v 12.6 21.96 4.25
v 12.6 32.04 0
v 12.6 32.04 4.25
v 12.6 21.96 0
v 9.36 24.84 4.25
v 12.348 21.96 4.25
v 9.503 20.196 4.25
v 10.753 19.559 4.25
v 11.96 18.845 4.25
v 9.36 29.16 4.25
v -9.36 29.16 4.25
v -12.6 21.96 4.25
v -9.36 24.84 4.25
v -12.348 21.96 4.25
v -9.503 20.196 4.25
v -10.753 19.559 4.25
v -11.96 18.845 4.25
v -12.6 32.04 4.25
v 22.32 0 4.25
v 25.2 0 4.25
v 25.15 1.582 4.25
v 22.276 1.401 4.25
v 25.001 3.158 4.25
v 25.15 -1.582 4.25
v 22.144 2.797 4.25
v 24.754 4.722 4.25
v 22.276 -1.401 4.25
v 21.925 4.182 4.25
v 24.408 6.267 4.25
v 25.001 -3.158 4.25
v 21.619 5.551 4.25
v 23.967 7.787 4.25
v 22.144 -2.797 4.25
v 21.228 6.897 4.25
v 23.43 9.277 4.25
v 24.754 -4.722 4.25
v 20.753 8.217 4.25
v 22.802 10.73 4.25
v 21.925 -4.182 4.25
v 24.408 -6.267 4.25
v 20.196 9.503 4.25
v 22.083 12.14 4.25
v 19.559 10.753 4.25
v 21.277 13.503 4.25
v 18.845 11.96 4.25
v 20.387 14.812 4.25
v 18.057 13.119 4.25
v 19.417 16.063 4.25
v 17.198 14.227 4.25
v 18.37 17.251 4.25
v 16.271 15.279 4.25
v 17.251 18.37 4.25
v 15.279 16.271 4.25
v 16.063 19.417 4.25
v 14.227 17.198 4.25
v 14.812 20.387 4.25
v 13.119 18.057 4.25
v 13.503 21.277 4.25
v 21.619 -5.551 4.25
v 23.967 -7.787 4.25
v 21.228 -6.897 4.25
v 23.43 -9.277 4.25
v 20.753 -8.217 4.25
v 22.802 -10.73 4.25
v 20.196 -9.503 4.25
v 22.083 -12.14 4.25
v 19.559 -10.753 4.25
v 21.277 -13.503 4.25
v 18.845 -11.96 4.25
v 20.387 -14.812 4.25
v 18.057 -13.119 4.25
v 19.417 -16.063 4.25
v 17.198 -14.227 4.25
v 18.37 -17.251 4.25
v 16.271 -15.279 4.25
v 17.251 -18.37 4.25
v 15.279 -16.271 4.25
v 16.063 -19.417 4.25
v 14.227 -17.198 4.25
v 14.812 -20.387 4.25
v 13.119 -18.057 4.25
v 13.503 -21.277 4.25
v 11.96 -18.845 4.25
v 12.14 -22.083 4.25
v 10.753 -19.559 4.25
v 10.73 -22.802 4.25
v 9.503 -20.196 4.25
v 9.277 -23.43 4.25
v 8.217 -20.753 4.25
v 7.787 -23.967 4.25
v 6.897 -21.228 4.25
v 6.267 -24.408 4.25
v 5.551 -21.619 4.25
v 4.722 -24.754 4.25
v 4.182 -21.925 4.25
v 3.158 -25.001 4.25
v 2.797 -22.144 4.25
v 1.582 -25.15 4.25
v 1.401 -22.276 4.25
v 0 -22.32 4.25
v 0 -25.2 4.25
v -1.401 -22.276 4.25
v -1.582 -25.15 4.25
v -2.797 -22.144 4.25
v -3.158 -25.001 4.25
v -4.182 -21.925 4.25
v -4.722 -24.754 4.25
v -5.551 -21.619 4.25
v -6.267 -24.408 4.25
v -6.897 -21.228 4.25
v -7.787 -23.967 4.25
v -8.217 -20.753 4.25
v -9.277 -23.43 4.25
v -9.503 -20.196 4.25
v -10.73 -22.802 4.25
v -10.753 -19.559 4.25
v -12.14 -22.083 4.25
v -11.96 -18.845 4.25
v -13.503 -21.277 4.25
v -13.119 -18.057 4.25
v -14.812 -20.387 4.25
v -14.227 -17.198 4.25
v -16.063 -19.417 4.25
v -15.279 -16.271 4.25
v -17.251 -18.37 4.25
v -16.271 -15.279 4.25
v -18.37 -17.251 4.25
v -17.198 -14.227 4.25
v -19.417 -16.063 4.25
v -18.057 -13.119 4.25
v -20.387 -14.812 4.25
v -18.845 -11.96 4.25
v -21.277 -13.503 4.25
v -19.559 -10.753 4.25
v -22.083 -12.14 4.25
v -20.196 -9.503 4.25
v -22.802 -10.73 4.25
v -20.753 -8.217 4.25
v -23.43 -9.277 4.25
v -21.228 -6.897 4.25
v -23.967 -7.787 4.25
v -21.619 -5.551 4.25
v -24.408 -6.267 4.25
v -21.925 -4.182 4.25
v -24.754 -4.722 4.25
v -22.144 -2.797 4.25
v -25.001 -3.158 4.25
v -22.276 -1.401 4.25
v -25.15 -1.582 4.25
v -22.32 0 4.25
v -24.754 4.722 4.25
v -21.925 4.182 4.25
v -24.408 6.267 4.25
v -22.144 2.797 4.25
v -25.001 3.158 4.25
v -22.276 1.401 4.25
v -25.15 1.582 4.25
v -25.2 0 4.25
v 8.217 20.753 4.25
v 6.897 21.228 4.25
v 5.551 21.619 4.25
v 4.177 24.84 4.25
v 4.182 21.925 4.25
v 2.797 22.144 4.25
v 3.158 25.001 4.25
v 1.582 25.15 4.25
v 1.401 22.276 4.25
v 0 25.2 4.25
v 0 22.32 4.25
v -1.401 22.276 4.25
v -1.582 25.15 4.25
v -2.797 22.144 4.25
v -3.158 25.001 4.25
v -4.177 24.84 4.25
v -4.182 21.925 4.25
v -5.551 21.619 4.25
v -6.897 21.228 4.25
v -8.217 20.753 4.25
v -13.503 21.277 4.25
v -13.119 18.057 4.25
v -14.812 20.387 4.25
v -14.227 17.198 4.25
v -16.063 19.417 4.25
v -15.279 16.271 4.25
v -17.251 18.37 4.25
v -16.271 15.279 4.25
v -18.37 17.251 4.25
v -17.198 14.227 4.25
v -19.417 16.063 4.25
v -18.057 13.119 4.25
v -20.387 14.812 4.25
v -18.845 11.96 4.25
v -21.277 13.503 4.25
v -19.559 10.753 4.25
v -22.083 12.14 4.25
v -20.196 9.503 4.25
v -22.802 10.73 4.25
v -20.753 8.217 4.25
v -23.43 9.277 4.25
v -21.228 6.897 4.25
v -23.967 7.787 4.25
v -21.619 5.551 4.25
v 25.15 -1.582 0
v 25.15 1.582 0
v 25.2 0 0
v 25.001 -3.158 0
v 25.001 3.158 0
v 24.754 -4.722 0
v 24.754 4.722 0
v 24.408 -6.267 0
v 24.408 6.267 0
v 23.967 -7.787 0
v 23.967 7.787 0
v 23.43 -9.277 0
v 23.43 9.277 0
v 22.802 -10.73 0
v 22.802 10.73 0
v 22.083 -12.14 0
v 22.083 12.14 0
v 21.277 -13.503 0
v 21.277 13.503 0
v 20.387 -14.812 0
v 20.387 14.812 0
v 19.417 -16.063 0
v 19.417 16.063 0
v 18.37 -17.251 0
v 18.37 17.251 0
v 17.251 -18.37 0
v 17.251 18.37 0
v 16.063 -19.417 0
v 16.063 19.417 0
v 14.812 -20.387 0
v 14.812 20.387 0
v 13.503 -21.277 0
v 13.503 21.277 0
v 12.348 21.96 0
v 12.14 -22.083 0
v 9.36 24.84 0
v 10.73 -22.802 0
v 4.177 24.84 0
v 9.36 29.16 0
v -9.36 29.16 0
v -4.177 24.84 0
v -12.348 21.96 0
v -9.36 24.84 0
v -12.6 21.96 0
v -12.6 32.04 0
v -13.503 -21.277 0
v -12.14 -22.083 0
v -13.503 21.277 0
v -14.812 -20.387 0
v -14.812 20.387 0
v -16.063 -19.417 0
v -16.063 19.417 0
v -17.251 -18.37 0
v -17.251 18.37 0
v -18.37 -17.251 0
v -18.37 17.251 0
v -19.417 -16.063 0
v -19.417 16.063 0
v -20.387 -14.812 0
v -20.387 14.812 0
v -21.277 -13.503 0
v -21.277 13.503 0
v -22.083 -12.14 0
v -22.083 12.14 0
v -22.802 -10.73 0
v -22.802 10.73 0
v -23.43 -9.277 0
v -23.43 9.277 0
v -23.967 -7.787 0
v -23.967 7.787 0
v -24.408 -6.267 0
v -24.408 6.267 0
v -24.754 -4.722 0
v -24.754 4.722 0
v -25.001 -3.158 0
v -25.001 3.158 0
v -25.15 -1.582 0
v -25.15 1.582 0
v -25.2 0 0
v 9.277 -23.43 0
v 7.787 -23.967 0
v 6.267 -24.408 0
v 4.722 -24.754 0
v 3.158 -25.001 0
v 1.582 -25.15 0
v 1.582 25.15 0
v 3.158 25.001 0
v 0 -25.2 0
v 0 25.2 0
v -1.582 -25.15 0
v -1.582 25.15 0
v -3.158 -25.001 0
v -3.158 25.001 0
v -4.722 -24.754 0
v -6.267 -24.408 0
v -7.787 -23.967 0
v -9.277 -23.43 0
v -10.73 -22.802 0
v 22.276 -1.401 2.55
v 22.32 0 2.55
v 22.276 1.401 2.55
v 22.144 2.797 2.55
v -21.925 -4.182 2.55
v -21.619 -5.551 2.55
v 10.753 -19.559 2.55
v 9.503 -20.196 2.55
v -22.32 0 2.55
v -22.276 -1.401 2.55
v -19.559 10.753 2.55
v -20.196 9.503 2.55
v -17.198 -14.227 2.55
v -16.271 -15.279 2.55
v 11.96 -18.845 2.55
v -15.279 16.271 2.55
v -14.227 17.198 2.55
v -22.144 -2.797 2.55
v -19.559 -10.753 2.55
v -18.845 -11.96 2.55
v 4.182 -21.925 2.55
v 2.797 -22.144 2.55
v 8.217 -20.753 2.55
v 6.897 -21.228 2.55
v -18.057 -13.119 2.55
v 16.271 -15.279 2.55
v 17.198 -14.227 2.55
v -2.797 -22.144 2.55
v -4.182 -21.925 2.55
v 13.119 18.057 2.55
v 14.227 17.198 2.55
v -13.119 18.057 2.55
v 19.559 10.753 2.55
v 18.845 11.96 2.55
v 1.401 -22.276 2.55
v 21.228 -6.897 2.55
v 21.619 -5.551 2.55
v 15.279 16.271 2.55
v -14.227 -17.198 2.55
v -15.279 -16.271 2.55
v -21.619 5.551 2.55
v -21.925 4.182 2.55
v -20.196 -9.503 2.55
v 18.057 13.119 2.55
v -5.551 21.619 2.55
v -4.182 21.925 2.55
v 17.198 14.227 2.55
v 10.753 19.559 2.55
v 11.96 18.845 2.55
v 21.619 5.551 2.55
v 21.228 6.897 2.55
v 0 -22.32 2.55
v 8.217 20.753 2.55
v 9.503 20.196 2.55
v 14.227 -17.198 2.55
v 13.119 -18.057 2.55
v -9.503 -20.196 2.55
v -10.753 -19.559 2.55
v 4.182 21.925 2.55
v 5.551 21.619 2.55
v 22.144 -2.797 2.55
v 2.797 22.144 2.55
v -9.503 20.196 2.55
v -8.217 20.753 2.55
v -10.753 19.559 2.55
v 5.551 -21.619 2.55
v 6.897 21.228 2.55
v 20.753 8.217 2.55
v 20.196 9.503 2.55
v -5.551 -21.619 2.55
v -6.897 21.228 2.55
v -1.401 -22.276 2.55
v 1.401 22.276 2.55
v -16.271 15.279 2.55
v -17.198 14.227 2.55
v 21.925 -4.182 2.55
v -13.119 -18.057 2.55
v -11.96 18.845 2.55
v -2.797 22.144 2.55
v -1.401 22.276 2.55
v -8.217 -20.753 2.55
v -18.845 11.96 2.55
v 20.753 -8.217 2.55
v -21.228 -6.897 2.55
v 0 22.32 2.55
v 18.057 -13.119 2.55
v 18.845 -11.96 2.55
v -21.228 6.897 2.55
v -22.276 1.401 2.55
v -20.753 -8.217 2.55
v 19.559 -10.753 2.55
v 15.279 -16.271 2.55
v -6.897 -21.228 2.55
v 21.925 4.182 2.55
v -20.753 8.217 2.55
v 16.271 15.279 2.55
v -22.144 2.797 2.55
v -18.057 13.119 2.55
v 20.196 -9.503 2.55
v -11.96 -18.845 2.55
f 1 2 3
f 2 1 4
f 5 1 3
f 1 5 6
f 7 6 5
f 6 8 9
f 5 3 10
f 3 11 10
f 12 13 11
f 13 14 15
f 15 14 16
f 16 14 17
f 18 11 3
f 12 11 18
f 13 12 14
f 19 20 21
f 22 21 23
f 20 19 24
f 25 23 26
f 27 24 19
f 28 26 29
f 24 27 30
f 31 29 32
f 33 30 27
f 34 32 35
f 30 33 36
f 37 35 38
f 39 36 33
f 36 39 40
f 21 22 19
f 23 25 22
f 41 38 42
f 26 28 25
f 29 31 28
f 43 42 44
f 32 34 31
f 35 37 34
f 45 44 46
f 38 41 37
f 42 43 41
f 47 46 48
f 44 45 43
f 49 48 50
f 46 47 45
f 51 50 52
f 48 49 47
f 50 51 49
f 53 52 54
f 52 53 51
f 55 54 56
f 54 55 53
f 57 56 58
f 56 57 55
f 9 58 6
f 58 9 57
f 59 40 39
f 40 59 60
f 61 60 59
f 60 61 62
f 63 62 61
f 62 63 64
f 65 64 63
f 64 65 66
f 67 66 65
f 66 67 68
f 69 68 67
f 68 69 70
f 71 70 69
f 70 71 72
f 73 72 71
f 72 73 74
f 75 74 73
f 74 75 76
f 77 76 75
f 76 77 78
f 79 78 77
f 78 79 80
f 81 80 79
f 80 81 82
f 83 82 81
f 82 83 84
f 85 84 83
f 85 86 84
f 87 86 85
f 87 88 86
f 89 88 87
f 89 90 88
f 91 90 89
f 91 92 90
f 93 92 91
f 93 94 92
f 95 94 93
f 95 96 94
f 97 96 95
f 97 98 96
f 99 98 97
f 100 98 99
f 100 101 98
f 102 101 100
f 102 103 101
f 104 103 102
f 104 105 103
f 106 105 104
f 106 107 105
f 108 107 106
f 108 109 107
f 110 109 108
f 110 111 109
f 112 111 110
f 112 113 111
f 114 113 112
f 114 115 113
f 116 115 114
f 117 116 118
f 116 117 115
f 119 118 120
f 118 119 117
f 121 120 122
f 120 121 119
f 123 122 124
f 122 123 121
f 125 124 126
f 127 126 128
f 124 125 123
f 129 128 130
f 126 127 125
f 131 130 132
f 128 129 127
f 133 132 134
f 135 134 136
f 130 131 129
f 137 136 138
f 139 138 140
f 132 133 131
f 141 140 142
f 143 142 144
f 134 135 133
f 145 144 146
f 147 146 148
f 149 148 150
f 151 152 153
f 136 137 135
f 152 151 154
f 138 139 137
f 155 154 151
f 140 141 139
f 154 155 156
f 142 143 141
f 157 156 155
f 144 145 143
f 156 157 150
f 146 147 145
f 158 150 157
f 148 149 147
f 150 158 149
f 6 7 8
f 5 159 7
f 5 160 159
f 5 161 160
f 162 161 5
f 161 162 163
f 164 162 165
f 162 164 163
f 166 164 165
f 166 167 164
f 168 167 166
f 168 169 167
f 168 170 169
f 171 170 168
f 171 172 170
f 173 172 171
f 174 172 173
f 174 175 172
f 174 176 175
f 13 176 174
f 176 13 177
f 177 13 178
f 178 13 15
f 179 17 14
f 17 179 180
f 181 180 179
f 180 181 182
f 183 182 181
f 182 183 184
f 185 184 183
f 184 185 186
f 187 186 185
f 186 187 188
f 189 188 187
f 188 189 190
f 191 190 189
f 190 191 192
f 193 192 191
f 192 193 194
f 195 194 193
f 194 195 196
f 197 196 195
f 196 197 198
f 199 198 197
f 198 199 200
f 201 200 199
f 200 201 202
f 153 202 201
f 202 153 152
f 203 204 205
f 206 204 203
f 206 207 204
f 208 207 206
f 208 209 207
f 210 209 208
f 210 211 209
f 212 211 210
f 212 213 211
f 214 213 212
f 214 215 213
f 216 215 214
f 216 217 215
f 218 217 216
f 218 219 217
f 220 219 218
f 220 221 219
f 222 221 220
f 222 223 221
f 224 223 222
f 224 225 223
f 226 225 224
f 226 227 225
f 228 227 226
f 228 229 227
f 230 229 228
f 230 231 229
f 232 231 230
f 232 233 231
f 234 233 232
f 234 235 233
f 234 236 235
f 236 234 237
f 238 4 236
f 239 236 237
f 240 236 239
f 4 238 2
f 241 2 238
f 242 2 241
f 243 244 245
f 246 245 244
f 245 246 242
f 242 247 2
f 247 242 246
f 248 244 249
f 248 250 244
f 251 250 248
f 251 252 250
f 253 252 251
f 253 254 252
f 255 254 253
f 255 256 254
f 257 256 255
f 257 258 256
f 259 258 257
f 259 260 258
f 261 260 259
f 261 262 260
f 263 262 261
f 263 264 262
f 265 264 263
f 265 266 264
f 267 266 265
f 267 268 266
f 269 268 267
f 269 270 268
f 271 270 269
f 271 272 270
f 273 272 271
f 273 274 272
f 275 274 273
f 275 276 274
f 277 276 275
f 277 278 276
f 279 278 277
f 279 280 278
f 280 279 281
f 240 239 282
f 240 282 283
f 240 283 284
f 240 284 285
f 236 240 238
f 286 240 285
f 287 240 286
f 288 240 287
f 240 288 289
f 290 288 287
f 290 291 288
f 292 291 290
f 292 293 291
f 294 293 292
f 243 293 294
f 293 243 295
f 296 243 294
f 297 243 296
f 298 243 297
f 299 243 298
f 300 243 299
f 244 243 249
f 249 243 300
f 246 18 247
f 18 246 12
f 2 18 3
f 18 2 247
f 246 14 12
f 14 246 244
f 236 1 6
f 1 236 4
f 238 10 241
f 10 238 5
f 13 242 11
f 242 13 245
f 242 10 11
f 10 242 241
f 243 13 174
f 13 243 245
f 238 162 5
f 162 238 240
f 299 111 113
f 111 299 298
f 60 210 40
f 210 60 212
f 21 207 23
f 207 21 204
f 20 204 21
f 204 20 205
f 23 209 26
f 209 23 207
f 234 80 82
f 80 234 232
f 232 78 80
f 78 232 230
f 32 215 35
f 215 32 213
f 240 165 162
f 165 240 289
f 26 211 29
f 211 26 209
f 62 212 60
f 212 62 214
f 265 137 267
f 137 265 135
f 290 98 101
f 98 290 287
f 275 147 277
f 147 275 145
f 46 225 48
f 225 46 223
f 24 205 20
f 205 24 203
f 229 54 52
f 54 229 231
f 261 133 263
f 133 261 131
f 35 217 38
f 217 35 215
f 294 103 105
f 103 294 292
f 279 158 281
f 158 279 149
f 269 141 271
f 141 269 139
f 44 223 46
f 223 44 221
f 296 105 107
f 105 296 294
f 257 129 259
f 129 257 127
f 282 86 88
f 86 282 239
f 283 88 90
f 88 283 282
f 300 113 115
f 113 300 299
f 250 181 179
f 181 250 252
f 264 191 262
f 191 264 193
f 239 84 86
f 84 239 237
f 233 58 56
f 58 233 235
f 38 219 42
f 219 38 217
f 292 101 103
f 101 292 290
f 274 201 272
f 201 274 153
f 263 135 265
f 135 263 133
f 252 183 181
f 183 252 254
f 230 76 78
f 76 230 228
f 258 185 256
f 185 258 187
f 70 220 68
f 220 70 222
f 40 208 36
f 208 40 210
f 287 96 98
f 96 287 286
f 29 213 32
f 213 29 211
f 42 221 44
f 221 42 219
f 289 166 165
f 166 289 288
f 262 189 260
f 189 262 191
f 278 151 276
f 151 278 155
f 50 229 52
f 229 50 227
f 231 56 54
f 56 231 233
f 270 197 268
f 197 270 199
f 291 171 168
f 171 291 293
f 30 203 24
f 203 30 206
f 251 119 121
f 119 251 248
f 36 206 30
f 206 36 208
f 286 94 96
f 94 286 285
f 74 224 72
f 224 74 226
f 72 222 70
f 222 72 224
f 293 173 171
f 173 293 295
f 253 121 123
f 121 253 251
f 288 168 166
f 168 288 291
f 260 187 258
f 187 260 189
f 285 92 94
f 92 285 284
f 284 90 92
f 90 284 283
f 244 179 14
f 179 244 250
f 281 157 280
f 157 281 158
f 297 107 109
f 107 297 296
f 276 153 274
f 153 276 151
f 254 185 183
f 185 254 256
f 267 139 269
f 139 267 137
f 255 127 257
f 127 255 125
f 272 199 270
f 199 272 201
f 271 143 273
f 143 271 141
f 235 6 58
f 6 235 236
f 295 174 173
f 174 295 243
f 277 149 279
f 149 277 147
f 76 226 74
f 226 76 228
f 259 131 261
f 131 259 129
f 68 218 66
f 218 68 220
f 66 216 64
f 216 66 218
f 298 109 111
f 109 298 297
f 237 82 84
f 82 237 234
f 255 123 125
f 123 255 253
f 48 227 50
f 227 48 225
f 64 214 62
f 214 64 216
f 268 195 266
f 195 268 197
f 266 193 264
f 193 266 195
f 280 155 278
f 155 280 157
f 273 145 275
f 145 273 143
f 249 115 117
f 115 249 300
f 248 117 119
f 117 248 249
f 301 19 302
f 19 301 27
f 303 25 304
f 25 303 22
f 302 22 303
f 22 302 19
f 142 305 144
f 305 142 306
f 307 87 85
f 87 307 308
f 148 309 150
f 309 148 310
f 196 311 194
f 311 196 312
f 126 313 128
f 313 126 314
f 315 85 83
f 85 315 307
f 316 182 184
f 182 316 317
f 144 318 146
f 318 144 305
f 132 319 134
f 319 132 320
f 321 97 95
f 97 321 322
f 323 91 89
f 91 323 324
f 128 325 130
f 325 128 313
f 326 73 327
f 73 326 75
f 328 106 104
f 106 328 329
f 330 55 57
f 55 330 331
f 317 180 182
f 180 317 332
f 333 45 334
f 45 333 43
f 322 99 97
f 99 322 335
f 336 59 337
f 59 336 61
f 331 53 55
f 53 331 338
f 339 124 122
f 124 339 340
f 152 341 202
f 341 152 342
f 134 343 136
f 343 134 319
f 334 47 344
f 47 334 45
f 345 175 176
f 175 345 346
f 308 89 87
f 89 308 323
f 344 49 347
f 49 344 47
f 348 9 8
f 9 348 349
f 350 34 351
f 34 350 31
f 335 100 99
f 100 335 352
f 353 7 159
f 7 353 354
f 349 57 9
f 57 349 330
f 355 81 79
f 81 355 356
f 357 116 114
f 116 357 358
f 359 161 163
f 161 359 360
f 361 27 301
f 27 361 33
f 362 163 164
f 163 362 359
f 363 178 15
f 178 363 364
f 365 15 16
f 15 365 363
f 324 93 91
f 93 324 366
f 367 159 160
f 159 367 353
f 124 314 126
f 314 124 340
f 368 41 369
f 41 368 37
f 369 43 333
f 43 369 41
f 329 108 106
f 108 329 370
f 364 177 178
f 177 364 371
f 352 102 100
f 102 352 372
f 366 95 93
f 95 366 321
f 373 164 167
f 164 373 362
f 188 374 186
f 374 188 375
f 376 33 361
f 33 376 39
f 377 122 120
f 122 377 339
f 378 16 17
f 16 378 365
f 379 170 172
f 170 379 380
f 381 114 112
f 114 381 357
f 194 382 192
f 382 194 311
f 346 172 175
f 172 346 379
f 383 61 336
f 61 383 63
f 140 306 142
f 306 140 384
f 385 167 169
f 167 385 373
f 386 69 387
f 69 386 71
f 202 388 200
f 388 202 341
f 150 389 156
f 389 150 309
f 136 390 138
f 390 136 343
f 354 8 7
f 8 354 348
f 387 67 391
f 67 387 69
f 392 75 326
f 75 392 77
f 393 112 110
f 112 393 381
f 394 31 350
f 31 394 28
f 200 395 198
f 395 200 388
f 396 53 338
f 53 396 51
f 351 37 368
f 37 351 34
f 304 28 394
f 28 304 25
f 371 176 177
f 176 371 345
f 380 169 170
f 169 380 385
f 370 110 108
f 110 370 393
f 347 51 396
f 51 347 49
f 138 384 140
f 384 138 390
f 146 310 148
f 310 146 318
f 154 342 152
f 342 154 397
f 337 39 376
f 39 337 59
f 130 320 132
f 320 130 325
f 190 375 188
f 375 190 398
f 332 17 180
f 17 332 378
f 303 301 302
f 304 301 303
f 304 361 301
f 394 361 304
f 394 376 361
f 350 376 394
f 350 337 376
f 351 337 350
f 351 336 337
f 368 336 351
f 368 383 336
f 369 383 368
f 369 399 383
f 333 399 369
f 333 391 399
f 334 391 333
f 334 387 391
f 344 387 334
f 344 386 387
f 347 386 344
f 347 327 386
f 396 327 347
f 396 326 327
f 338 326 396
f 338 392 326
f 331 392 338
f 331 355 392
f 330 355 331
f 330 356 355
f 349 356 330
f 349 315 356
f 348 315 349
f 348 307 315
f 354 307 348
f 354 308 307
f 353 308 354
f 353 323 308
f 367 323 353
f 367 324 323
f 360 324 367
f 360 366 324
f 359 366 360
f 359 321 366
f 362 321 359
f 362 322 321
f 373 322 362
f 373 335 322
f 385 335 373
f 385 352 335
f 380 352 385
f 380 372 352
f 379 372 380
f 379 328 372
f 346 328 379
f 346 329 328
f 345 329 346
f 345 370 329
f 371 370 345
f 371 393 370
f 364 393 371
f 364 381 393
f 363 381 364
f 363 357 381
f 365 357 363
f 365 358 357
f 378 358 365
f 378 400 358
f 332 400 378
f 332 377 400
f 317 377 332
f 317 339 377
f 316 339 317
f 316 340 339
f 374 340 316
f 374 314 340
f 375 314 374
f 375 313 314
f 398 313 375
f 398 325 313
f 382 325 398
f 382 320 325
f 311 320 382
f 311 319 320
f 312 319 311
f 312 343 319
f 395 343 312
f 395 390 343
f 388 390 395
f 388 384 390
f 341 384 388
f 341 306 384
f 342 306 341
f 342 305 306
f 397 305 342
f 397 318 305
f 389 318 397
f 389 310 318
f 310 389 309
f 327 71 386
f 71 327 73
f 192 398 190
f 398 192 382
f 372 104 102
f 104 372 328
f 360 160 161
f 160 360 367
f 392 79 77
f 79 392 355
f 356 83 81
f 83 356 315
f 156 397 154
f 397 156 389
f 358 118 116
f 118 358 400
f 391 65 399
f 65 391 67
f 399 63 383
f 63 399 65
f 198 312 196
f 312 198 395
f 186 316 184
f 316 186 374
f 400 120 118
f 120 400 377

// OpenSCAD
detail = 100;

module medaille(){
    difference(){
        union(){
    color("blue") cylinder(r=70, h=5, $fn=detail);
    translate([0,75,2.5]) color("blue") 
    difference(){
        cube([70,28,5], center=true);
        cube([52,12,6], center=true);
    }
}
    translate([0,0,3]) cylinder(r=62, h=5, $fn=detail);
}

}

module medaille_reduite(){
    scale([0.36,0.36,0.85]) medaille();
}

module medaille_evg(){
    medaille_reduite();
    translate([-35.5,-31.5,0.1])
    linear_extrude(4.5) 
    scale(0.75) import("evg.dxf");
}

module medaille_futur_marie(){
    medaille_reduite();
    translate([-77,-105,0.1])
    linear_extrude(4.5) 
    scale(0.72) import("futur_marie.dxf");
}

medaille_futur_marie();
